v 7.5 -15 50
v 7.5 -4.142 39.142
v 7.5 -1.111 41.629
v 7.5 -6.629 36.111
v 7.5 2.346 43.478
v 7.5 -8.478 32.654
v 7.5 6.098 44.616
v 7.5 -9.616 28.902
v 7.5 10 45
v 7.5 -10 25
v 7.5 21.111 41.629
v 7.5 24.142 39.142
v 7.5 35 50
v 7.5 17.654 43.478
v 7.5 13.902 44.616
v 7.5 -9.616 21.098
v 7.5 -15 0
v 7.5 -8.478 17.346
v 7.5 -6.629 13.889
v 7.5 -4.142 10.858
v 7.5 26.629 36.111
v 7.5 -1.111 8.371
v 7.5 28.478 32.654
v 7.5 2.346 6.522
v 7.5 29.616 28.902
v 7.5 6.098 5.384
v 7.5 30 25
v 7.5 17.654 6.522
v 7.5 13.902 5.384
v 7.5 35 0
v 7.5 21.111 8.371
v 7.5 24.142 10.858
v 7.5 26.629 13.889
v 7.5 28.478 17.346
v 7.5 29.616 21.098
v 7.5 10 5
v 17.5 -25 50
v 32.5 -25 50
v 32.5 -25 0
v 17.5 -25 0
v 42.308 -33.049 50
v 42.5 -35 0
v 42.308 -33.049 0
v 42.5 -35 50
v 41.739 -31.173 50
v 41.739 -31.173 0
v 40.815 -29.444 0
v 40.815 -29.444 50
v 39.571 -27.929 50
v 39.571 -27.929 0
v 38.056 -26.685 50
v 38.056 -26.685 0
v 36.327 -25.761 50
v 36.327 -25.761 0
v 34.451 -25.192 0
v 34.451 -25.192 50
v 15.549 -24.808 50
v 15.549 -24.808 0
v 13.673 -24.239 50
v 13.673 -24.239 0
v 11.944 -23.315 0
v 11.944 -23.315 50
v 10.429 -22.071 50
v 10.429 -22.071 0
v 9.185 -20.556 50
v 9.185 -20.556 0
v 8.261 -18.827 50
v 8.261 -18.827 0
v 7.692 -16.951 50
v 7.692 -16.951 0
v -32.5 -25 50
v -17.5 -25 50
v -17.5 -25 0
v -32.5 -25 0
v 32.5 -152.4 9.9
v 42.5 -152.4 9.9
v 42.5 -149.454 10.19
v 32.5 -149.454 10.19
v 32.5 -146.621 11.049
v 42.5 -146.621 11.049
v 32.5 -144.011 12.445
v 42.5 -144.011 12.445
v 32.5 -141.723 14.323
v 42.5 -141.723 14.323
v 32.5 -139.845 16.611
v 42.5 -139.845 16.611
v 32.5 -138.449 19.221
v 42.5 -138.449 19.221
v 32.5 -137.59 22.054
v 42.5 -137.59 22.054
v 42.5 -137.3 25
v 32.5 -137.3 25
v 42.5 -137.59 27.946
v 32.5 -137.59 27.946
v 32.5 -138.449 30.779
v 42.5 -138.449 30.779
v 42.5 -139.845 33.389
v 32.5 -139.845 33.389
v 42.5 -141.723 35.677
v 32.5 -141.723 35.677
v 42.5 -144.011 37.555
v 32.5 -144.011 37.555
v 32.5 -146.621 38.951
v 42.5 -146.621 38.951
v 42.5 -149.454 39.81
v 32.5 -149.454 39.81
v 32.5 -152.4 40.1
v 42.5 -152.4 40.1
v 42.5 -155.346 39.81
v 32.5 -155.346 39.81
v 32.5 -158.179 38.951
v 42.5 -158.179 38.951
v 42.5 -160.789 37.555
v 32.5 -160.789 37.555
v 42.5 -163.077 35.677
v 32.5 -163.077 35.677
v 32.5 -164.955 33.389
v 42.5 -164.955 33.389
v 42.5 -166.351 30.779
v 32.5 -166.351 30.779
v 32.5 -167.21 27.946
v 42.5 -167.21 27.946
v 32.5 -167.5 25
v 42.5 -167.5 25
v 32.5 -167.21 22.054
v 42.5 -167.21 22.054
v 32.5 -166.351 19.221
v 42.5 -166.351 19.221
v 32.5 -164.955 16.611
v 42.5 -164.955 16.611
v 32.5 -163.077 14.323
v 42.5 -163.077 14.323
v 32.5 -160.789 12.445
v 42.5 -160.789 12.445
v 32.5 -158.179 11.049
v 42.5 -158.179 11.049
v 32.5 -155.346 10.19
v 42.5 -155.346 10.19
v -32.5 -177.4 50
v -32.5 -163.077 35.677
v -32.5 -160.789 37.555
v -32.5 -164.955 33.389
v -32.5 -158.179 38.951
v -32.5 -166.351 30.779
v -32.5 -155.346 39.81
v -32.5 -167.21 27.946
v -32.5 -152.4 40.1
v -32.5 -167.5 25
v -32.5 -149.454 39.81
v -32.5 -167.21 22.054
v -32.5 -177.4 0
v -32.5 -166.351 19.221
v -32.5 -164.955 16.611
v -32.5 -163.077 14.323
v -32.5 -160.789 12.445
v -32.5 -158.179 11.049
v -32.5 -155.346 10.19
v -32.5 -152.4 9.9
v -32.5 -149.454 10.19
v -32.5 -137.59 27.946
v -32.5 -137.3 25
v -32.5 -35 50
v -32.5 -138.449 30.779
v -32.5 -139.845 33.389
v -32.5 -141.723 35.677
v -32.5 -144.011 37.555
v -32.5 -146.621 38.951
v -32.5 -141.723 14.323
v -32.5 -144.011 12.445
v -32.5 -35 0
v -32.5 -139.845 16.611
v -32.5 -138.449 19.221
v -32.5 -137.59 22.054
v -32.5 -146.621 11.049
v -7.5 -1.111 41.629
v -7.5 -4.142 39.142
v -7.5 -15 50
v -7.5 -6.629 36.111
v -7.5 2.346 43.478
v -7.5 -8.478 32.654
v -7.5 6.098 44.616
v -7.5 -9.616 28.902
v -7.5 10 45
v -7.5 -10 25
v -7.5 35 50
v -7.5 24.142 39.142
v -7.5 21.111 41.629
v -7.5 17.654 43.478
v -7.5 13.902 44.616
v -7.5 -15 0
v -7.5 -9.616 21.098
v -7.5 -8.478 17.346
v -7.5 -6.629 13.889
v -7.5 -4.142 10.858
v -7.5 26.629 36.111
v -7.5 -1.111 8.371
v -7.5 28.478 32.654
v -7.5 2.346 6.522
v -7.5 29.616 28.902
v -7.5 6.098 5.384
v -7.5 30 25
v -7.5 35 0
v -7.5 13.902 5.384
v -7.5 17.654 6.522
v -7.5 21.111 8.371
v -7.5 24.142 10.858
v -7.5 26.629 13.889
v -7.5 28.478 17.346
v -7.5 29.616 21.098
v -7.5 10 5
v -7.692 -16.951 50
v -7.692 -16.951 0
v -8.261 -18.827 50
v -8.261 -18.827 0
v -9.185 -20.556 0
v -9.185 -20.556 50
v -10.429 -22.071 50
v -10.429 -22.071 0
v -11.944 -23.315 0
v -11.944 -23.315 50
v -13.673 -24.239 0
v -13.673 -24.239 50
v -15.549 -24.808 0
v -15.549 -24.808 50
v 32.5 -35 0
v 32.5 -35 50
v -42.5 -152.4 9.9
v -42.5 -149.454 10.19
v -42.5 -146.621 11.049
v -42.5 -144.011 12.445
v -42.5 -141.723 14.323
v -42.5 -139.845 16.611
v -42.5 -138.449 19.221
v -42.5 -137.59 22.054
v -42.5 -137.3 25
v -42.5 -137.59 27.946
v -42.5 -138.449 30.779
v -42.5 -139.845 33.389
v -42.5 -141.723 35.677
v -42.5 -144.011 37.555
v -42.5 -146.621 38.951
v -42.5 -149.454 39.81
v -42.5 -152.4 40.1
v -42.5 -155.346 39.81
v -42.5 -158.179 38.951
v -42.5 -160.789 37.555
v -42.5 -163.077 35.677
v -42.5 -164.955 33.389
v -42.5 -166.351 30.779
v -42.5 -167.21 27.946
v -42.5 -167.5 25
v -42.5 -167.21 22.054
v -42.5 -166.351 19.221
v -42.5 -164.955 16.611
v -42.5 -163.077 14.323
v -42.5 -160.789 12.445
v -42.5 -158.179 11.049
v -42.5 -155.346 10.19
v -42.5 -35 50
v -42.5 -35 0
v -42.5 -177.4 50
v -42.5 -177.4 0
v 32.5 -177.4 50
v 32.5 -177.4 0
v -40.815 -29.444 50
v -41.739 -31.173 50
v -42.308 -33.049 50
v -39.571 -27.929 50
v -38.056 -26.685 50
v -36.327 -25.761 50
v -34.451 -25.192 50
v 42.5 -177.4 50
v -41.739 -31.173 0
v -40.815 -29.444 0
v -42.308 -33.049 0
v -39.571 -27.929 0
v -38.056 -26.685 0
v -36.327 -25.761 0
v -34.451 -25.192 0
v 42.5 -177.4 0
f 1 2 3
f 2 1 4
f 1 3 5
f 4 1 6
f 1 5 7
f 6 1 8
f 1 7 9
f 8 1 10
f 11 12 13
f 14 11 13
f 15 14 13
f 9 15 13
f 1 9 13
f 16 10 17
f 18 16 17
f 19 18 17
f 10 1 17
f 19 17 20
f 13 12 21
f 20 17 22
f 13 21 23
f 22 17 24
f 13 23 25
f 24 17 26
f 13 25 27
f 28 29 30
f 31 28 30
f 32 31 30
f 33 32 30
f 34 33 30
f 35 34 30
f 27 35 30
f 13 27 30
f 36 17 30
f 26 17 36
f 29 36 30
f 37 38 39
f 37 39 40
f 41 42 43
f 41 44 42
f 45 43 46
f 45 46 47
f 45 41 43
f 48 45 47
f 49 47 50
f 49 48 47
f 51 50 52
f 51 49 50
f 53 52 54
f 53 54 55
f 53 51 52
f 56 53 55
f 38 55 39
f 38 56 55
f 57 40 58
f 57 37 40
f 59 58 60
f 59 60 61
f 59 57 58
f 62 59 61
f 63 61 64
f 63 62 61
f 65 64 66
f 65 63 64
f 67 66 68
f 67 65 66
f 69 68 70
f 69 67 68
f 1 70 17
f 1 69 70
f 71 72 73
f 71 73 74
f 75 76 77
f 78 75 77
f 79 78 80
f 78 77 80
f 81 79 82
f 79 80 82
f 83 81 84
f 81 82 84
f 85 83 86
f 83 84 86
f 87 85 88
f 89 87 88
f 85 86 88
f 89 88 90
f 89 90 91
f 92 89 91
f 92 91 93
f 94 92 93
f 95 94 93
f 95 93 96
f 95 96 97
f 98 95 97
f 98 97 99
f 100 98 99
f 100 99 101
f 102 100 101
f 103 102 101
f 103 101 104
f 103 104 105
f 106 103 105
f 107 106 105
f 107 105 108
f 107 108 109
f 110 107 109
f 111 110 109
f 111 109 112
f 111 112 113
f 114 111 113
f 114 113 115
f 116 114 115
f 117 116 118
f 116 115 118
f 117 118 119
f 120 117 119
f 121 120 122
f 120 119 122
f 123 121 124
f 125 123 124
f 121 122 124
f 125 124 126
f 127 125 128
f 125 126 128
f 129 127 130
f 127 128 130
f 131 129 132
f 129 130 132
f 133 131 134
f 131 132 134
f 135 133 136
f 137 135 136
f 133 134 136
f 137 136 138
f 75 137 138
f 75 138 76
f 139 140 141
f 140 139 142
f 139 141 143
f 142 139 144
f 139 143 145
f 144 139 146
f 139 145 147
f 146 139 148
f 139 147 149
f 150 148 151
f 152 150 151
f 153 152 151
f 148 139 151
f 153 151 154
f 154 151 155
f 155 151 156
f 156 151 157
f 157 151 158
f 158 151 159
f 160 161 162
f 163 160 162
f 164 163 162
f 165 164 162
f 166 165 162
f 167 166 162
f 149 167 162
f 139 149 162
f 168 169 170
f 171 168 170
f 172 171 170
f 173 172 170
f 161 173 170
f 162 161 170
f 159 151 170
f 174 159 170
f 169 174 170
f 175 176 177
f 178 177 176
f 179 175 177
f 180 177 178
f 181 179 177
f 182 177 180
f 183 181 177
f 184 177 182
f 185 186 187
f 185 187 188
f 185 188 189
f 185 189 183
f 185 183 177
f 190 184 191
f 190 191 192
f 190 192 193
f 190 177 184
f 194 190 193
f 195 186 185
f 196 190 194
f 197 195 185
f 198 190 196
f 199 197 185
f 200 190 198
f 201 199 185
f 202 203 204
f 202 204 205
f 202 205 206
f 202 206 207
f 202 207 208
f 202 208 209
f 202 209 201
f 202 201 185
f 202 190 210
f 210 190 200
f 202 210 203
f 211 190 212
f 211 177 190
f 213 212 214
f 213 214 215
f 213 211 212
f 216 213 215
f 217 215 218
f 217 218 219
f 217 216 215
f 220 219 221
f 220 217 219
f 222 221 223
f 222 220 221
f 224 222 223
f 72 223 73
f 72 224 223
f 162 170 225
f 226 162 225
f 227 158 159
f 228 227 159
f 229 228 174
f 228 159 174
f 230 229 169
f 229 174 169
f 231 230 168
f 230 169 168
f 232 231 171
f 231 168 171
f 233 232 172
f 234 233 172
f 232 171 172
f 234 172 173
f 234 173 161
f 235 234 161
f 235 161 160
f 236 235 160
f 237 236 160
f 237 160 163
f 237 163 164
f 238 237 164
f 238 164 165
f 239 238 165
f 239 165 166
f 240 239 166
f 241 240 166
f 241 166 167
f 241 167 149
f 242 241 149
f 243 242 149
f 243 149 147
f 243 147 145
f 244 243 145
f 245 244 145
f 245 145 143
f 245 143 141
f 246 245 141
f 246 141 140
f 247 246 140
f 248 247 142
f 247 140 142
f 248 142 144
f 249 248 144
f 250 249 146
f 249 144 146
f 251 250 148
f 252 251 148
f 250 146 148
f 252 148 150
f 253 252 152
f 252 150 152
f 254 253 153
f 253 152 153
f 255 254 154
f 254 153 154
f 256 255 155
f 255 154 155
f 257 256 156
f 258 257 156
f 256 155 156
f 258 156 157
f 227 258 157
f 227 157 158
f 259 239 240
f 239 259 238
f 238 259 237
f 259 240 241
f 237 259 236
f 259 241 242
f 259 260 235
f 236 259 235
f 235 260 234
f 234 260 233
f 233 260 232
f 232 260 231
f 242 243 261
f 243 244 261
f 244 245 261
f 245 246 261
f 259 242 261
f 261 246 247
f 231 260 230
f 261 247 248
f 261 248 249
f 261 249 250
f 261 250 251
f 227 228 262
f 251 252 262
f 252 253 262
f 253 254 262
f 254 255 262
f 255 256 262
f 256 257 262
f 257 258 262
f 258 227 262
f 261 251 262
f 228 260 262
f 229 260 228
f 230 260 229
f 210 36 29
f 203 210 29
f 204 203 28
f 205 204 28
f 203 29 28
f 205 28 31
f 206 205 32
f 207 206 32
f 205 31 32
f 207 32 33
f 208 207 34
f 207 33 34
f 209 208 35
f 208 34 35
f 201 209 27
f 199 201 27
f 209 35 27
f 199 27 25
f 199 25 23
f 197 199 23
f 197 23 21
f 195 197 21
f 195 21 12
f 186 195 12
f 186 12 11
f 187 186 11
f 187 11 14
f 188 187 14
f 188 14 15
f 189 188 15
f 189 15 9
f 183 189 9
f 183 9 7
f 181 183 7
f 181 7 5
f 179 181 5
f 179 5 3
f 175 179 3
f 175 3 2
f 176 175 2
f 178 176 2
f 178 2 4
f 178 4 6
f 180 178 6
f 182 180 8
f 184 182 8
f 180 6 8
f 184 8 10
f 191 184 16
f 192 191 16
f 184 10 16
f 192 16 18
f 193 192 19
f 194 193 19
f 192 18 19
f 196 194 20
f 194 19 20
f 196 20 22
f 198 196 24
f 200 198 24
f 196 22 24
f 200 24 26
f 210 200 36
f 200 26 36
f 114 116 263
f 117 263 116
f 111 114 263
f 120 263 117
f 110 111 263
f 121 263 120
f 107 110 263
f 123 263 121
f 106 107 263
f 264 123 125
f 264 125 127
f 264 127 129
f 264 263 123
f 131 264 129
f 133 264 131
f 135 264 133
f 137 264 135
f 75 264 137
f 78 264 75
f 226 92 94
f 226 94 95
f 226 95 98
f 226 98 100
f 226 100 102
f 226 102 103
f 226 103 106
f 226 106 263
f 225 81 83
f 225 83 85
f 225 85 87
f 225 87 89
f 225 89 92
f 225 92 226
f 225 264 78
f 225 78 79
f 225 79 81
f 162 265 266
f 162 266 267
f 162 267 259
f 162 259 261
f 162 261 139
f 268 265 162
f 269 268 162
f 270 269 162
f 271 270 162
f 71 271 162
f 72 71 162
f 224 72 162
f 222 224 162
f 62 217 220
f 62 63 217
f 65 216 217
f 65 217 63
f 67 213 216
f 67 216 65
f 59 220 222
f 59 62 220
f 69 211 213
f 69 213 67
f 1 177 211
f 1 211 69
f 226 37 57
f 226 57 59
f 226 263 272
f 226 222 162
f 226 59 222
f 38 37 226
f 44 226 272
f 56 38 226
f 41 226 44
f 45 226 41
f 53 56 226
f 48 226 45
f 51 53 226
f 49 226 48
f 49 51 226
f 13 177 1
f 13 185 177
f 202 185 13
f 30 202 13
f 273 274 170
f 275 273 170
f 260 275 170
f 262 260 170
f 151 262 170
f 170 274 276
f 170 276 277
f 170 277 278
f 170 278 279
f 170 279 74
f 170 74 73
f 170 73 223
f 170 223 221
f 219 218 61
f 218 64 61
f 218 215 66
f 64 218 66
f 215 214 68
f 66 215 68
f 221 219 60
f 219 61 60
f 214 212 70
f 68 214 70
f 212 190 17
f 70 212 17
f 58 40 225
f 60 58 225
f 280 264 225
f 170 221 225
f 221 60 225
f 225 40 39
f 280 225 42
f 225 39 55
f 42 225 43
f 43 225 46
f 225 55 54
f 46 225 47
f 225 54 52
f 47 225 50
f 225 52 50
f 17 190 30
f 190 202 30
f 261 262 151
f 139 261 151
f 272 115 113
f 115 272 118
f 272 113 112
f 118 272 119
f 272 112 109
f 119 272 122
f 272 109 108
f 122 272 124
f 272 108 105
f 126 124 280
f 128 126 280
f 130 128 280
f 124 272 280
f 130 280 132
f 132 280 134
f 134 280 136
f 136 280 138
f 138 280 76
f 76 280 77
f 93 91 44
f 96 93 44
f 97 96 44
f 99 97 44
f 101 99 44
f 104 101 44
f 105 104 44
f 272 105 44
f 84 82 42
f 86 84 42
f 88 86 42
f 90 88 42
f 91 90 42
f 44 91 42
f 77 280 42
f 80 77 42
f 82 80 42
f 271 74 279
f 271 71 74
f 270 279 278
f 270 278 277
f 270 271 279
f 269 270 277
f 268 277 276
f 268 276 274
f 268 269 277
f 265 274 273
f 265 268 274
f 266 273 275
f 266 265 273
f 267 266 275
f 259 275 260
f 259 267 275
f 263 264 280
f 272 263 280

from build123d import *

# Parameters (mm, degrees)
SKETCH1_W               = 10
SKETCH1_H               = 142.4
SKETCH1_H_2             = 10
SKETCH1_W_2             = 25
SKETCH1_W_3             = 15
SKETCH1_H_3             = 60
BOSS_EXTRUDE1_DEPTH     = 50
FILLET1_R               = 10
SKETCH2_R               = 20
CUT_EXTRUDE1_DEPTH      = 36
CUT_EXTRUDE1_DEPTH_BACK = 51
SKETCH3_R               = 15.1
CUT_EXTRUDE2_DEPTH      = 1
CUT_EXTRUDE2_DEPTH_BACK = 86


with BuildPart() as part:
    # Sketch1 → Boss-Extrude1 (new body)
    with BuildSketch(Plane.XY):
        with Locations((-37.5, -106.2)):
            Rectangle(SKETCH1_W, SKETCH1_H)
        with Locations((-37.5, -30)):
            Rectangle(SKETCH1_W, SKETCH1_H_2)
        with Locations((-20, -30)):
            Rectangle(SKETCH1_W_2, SKETCH1_H_2)
        with Locations((0, -30)):
            Rectangle(SKETCH1_W_3, SKETCH1_H_2)
        with Locations((0, 5)):
            Rectangle(SKETCH1_W_3, SKETCH1_H_3)
        with Locations((20, -30)):
            Rectangle(SKETCH1_W_2, SKETCH1_H_2)
        with Locations((37.5, -30)):
            Rectangle(SKETCH1_W, SKETCH1_H_2)
        with Locations((37.5, -106.2)):
            Rectangle(SKETCH1_W, SKETCH1_H)
    extrude(amount=BOSS_EXTRUDE1_DEPTH)

    # Fillet1
    fillet1_edges = [part.edges().sort_by_distance(p)[0] for p in [
        (-42.5, -25, 25),
        (-7.5, -25, 25),
        (7.5, -25, 25),
        (42.5, -25, 25),
    ]]
    fillet(fillet1_edges, radius=FILLET1_R)

    # Sketch2 → Cut-Extrude1 (cut, two sides)
    with BuildSketch(Plane(origin=(7.5, 0, 0), x_dir=(0, 0, -1), z_dir=(1, 0, 0))) as cut_extrude1_sk:
        with Locations((-25, 10)):
            Circle(SKETCH2_R)
    extrude(amount=CUT_EXTRUDE1_DEPTH, mode=Mode.SUBTRACT)
    extrude(cut_extrude1_sk.sketch, amount=-CUT_EXTRUDE1_DEPTH_BACK, mode=Mode.SUBTRACT)

    # Sketch3 → Cut-Extrude2 (cut, two sides)
    with BuildSketch(Plane(origin=(42.5, 0, 0), x_dir=(0, 0, -1), z_dir=(1, 0, 0))) as cut_extrude2_sk:
        with Locations((-25, -152.4)):
            Circle(SKETCH3_R)
    extrude(amount=CUT_EXTRUDE2_DEPTH, mode=Mode.SUBTRACT)
    extrude(cut_extrude2_sk.sketch, amount=-CUT_EXTRUDE2_DEPTH_BACK, mode=Mode.SUBTRACT)


solid = part.part
